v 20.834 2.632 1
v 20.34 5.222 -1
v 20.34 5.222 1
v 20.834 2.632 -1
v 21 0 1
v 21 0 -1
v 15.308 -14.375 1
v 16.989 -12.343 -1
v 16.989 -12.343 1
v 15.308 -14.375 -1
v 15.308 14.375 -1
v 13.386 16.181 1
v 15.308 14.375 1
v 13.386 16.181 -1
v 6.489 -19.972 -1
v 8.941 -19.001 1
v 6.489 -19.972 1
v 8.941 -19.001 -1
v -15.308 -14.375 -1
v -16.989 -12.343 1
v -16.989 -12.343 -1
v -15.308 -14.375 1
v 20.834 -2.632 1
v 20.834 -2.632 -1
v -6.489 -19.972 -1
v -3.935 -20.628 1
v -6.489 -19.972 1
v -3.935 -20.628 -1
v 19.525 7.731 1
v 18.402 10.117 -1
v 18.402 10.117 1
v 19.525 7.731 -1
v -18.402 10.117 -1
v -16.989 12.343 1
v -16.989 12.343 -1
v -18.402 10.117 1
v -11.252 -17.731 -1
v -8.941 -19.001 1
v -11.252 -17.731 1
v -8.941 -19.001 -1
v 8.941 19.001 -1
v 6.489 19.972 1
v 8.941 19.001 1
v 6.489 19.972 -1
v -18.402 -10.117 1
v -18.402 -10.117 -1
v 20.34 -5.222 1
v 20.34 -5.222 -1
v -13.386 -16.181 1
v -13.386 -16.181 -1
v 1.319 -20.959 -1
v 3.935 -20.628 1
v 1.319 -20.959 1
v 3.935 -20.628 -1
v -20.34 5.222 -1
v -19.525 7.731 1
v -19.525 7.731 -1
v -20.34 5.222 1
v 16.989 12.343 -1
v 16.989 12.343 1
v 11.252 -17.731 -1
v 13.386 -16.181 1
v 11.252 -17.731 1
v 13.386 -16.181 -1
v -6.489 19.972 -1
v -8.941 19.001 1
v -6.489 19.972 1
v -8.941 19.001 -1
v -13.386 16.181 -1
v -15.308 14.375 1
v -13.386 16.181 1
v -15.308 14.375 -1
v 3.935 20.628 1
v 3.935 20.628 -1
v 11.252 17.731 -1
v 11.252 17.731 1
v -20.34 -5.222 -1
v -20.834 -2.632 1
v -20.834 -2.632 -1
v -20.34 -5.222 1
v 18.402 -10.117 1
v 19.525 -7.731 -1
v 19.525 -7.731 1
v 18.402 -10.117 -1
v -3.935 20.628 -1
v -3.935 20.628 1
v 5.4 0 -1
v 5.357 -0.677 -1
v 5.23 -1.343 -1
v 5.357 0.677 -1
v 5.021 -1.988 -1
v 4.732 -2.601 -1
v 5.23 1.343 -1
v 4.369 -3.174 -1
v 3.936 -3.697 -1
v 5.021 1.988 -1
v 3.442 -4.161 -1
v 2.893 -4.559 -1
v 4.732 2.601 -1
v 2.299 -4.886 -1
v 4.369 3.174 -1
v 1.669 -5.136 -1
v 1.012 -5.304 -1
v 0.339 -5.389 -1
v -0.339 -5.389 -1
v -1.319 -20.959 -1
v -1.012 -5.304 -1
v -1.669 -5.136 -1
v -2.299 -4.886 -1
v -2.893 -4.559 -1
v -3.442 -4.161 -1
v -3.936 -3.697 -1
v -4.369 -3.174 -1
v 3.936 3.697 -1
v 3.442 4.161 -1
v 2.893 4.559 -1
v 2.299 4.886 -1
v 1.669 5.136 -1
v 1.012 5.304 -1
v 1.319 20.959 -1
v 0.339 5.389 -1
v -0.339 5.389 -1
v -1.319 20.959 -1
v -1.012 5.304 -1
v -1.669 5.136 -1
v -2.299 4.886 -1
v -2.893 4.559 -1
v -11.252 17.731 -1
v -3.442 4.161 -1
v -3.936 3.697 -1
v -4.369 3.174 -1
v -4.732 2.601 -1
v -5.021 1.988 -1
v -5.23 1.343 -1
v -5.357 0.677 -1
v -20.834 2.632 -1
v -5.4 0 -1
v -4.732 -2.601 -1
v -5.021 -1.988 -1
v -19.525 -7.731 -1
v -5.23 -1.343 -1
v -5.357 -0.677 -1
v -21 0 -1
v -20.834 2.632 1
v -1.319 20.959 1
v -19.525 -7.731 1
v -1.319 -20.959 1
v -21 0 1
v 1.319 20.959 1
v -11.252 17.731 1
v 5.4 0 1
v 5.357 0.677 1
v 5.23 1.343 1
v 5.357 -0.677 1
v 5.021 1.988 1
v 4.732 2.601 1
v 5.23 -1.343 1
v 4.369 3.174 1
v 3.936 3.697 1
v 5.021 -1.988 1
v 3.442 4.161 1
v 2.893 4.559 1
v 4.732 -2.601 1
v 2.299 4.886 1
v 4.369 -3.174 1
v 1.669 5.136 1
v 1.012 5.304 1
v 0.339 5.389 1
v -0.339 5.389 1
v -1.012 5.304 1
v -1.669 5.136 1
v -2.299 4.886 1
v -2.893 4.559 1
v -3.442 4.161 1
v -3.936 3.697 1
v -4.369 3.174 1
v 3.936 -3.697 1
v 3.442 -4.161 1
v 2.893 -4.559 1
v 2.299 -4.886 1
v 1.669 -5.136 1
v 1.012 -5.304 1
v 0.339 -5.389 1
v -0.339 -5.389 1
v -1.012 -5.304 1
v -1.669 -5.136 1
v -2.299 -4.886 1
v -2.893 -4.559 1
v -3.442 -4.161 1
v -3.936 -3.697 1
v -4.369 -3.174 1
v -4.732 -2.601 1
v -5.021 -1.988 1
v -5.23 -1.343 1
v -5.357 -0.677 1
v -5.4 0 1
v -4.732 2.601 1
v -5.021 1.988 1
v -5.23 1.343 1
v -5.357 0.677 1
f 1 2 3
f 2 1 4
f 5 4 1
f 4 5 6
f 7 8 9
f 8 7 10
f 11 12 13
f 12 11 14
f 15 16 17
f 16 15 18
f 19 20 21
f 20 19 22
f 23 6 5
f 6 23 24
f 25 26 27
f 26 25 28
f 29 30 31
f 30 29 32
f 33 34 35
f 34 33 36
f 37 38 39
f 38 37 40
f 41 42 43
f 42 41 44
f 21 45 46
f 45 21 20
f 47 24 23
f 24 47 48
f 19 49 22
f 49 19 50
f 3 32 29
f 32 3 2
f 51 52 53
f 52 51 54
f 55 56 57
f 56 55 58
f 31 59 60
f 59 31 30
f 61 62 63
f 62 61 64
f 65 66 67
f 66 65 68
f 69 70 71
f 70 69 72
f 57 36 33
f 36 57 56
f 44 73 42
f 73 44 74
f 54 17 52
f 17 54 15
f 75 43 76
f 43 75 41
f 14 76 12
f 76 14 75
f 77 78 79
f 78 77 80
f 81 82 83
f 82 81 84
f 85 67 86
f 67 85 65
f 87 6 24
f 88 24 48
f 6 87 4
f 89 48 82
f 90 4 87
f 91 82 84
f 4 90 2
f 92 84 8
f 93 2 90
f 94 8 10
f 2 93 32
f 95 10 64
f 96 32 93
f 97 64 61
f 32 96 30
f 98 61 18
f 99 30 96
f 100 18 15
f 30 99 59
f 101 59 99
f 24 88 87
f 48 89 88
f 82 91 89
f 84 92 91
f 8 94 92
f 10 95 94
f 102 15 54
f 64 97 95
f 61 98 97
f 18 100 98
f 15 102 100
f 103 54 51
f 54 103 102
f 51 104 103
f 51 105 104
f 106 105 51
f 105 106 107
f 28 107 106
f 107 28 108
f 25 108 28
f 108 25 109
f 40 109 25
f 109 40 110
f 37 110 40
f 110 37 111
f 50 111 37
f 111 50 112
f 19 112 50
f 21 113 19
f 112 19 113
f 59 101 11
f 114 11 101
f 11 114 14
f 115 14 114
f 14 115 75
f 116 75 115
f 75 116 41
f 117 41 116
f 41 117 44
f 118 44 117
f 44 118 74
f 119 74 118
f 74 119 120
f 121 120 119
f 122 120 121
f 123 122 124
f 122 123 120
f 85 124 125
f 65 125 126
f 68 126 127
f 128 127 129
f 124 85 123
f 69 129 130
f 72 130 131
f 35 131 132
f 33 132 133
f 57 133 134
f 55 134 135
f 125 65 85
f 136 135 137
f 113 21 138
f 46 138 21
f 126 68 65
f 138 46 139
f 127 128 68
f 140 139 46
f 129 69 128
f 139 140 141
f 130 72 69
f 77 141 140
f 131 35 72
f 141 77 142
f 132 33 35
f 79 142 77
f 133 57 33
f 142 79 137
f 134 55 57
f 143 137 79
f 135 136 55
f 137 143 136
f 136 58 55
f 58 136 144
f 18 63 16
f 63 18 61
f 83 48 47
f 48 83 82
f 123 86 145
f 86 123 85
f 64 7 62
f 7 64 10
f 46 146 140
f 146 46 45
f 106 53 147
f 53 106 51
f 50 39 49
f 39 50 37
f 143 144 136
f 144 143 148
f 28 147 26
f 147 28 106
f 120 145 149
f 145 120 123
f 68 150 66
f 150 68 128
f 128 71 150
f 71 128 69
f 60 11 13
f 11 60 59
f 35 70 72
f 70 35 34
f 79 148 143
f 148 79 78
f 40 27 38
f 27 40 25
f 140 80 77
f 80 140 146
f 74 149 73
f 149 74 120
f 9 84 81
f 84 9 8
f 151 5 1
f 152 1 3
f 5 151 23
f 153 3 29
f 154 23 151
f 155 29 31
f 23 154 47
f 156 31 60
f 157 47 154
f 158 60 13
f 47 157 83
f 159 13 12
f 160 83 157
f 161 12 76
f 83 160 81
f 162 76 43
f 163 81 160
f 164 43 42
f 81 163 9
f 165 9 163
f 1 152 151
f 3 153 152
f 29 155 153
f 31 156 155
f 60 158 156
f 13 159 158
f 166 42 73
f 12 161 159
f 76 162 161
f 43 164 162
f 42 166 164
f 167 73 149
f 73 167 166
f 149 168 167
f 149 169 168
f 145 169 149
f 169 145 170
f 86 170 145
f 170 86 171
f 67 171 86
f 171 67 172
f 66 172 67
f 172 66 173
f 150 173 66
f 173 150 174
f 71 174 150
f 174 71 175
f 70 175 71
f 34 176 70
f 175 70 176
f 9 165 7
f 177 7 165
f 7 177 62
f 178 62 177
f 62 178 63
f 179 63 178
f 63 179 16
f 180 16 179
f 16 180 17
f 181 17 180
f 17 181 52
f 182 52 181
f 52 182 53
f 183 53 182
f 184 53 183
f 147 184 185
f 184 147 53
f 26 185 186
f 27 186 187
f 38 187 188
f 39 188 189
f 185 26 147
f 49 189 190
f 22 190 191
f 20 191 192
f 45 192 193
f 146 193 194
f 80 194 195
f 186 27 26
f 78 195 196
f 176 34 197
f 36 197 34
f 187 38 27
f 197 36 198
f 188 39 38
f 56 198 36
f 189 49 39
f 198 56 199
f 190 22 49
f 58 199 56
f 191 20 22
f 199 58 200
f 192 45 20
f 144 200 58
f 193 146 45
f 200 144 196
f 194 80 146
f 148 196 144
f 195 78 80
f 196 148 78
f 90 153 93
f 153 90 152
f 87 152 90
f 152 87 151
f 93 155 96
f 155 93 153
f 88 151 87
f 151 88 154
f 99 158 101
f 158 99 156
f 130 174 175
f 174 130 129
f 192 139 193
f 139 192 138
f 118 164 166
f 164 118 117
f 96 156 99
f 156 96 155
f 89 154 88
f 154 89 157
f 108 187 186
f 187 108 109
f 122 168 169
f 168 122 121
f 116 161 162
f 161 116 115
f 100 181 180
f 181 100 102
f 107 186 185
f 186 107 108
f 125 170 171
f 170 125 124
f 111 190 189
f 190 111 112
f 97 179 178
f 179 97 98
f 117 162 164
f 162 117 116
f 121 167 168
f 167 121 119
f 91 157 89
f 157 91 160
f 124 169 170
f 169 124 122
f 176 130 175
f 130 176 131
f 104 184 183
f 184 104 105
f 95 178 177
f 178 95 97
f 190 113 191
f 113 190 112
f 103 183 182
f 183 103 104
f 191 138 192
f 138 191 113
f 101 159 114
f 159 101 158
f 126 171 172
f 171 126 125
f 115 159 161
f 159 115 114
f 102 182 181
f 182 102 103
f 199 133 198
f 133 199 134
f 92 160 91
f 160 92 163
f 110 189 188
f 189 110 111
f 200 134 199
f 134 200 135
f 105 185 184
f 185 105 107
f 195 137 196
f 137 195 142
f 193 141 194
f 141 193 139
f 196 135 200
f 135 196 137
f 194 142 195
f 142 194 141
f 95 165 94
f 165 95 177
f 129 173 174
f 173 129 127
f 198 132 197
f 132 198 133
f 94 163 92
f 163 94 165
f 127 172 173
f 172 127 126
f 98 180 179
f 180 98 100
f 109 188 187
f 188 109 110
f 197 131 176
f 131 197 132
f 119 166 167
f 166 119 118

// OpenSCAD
// file: roundedcube.scad
// More information: https://danielupshaw.com/openscad-rounded-corners/

// Set to 0.01 for higher definition curves (renders slower)
$fs = 0.15;

module roundedcube(size = [1, 1, 1], center = false, radius = 0.5, apply_to = "all") {
	// If single value, convert to [x, y, z] vector
	size = (size[0] == undef) ? [size, size, size] : size;

	translate_min = radius;
	translate_xmax = size[0] - radius;
	translate_ymax = size[1] - radius;
	translate_zmax = size[2] - radius;

	diameter = radius * 2;

	obj_translate = (center == false) ?
		[0, 0, 0] : [
			-(size[0] / 2),
			-(size[1] / 2),
			-(size[2] / 2)
		];

	translate(v = obj_translate) {
		hull() {
			for (translate_x = [translate_min, translate_xmax]) {
				x_at = (translate_x == translate_min) ? "min" : "max";
				for (translate_y = [translate_min, translate_ymax]) {
					y_at = (translate_y == translate_min) ? "min" : "max";
					for (translate_z = [translate_min, translate_zmax]) {
						z_at = (translate_z == translate_min) ? "min" : "max";

						translate(v = [translate_x, translate_y, translate_z])
						if (
							(apply_to == "all") ||
							(apply_to == "xmin" && x_at == "min") || (apply_to == "xmax" && x_at == "max") ||
							(apply_to == "ymin" && y_at == "min") || (apply_to == "ymax" && y_at == "max") ||
							(apply_to == "zmin" && z_at == "min") || (apply_to == "zmax" && z_at == "max")
						) {
							sphere(r = radius);
						} else {
							rotate = 
								(apply_to == "xmin" || apply_to == "xmax" || apply_to == "x") ? [0, 90, 0] : (
								(apply_to == "ymin" || apply_to == "ymax" || apply_to == "y") ? [90, 90, 0] :
								[0, 0, 0]
							);
							rotate(a = rotate)
							cylinder(h = diameter, r = radius, center = true);
						}
					}
				}
			}
		}
	}
}
// file: parameters.scad
/* Copyright Brian Stephan 2023
 *
 * This file is part of the Buildable Stick System.
 *
 * The Buildable Stick System is free software: you can redistribute it and/or modify
 * it under the terms of the GNU General Public License as published by the
 * Free Software Foundation, either version 3 of the License, or (at your
 * option) any later version.
 *
 * The Buildable Stick System is distributed in the hope that it will be useful, but
 * WITHOUT ANY WARRANTY; without even the implied warranty of MERCHANTABILITY
 * or FITNESS FOR A PARTICULAR PURPOSE. See the GNU General Public License for
 * more details.
 *
 * You should have received a copy of the GNU General Public License along with
 * the Buildable Stick System. If not, see <https://www.gnu.org/licenses/>.
 */

// adjustments
hole_tolerance = 0.15;

// M2
m2_screw_selftap_radius = 0.95;

// M3
m3_screw_selftap_radius = 1.3;

// M4
m4_bolt_radius = 2 + hole_tolerance;
m4_bolt_countersink_radius = 6.1 + hole_tolerance;
m4_bolt_hex_exterior_radius = 3.6 + hole_tolerance;

// 24mm button
small_button_radius = 12 + hole_tolerance;

// 30mm button
big_button_radius = 15 + hole_tolerance;

// JLF mount dimensions
lever_mount_x = 53;
lever_mount_y = 95;
lever_mount_z = 2;

// standard lever hole
lever_plate_hole = 12;

// case dimensions
// base frame box. reminder: top of inside (including mounts) is chopped by top_plate_z for plates
frame_x = 233;
frame_y = 208;
frame_z = 55;

frame_center_to_neutrik = 70;

// depth of the "lip" of the frame that the top plate sets into/supports the overhang
frame_wall = 4;

// per neutrik (mm)
neutrik_panel_thickness = 3;

// top plate, which can either be the whole plate ("inset") or the mounting frame for a plate that overhangs
top_plate_x = frame_x - (frame_wall * 2);
top_plate_y = frame_y - (frame_wall * 2);
top_plate_z = 5;

// how much the top plate x/y is expanded to overhang the frame
// note that this is relative to the top plate (so the wall is added back)
top_plate_overhang_amount = 8.5;
overhang_top_plate_x = top_plate_x + (frame_wall * 2) + (top_plate_overhang_amount * 2);
overhang_top_plate_y = top_plate_y + (frame_wall * 2) + (top_plate_overhang_amount * 2);

plate_to_frame_point_x = (top_plate_x/2)-10;
plate_to_frame_point_y = (top_plate_y/2)-10;

// frame interior that supports the top plates
panel_support_width = 5;

// neutrik D screw holes
neutrik_d_screw_radius = 1.6 + hole_tolerance;
neutrik_d_radius = 12 + hole_tolerance;

// additional button radius for decorative panels, etc.
decorative_radius_scale = 1.75;
jumbo_decorative_radius_scale = 2;
// main file
/* Copyright Brian Stephan 2023
 * SPDX-License-Identifier: GPL-3.0-or-later
 *
 * This file is part of the Buildable Stick System.
 *
 * The Buildable Stick System is free software: you can redistribute it and/or modify
 * it under the terms of the GNU General Public License as published by the
 * Free Software Foundation, either version 3 of the License, or (at your
 * option) any later version.
 *
 * The Buildable Stick System is distributed in the hope that it will be useful, but
 * WITHOUT ANY WARRANTY; without even the implied warranty of MERCHANTABILITY
 * or FITNESS FOR A PARTICULAR PURPOSE. See the GNU General Public License for
 * more details.
 *
 * You should have received a copy of the GNU General Public License along with
 * the Buildable Stick System. If not, see <https://www.gnu.org/licenses/>.
 */

include <parameters.scad>
include <components.scad>

module lsx_nobi_dustwasher() {
	difference() {
		cylinder(r=lever_plate_hole*decorative_radius_scale, h=2, $fn=50, center=true);
		// 5.25 = 5 (diameter of shaft is 10mm) + .25 to let it take an angle
		cylinder(r=5.25+hole_tolerance, h=2.1, $fn=50, center=true);
	}
}

lsx_nobi_dustwasher();
